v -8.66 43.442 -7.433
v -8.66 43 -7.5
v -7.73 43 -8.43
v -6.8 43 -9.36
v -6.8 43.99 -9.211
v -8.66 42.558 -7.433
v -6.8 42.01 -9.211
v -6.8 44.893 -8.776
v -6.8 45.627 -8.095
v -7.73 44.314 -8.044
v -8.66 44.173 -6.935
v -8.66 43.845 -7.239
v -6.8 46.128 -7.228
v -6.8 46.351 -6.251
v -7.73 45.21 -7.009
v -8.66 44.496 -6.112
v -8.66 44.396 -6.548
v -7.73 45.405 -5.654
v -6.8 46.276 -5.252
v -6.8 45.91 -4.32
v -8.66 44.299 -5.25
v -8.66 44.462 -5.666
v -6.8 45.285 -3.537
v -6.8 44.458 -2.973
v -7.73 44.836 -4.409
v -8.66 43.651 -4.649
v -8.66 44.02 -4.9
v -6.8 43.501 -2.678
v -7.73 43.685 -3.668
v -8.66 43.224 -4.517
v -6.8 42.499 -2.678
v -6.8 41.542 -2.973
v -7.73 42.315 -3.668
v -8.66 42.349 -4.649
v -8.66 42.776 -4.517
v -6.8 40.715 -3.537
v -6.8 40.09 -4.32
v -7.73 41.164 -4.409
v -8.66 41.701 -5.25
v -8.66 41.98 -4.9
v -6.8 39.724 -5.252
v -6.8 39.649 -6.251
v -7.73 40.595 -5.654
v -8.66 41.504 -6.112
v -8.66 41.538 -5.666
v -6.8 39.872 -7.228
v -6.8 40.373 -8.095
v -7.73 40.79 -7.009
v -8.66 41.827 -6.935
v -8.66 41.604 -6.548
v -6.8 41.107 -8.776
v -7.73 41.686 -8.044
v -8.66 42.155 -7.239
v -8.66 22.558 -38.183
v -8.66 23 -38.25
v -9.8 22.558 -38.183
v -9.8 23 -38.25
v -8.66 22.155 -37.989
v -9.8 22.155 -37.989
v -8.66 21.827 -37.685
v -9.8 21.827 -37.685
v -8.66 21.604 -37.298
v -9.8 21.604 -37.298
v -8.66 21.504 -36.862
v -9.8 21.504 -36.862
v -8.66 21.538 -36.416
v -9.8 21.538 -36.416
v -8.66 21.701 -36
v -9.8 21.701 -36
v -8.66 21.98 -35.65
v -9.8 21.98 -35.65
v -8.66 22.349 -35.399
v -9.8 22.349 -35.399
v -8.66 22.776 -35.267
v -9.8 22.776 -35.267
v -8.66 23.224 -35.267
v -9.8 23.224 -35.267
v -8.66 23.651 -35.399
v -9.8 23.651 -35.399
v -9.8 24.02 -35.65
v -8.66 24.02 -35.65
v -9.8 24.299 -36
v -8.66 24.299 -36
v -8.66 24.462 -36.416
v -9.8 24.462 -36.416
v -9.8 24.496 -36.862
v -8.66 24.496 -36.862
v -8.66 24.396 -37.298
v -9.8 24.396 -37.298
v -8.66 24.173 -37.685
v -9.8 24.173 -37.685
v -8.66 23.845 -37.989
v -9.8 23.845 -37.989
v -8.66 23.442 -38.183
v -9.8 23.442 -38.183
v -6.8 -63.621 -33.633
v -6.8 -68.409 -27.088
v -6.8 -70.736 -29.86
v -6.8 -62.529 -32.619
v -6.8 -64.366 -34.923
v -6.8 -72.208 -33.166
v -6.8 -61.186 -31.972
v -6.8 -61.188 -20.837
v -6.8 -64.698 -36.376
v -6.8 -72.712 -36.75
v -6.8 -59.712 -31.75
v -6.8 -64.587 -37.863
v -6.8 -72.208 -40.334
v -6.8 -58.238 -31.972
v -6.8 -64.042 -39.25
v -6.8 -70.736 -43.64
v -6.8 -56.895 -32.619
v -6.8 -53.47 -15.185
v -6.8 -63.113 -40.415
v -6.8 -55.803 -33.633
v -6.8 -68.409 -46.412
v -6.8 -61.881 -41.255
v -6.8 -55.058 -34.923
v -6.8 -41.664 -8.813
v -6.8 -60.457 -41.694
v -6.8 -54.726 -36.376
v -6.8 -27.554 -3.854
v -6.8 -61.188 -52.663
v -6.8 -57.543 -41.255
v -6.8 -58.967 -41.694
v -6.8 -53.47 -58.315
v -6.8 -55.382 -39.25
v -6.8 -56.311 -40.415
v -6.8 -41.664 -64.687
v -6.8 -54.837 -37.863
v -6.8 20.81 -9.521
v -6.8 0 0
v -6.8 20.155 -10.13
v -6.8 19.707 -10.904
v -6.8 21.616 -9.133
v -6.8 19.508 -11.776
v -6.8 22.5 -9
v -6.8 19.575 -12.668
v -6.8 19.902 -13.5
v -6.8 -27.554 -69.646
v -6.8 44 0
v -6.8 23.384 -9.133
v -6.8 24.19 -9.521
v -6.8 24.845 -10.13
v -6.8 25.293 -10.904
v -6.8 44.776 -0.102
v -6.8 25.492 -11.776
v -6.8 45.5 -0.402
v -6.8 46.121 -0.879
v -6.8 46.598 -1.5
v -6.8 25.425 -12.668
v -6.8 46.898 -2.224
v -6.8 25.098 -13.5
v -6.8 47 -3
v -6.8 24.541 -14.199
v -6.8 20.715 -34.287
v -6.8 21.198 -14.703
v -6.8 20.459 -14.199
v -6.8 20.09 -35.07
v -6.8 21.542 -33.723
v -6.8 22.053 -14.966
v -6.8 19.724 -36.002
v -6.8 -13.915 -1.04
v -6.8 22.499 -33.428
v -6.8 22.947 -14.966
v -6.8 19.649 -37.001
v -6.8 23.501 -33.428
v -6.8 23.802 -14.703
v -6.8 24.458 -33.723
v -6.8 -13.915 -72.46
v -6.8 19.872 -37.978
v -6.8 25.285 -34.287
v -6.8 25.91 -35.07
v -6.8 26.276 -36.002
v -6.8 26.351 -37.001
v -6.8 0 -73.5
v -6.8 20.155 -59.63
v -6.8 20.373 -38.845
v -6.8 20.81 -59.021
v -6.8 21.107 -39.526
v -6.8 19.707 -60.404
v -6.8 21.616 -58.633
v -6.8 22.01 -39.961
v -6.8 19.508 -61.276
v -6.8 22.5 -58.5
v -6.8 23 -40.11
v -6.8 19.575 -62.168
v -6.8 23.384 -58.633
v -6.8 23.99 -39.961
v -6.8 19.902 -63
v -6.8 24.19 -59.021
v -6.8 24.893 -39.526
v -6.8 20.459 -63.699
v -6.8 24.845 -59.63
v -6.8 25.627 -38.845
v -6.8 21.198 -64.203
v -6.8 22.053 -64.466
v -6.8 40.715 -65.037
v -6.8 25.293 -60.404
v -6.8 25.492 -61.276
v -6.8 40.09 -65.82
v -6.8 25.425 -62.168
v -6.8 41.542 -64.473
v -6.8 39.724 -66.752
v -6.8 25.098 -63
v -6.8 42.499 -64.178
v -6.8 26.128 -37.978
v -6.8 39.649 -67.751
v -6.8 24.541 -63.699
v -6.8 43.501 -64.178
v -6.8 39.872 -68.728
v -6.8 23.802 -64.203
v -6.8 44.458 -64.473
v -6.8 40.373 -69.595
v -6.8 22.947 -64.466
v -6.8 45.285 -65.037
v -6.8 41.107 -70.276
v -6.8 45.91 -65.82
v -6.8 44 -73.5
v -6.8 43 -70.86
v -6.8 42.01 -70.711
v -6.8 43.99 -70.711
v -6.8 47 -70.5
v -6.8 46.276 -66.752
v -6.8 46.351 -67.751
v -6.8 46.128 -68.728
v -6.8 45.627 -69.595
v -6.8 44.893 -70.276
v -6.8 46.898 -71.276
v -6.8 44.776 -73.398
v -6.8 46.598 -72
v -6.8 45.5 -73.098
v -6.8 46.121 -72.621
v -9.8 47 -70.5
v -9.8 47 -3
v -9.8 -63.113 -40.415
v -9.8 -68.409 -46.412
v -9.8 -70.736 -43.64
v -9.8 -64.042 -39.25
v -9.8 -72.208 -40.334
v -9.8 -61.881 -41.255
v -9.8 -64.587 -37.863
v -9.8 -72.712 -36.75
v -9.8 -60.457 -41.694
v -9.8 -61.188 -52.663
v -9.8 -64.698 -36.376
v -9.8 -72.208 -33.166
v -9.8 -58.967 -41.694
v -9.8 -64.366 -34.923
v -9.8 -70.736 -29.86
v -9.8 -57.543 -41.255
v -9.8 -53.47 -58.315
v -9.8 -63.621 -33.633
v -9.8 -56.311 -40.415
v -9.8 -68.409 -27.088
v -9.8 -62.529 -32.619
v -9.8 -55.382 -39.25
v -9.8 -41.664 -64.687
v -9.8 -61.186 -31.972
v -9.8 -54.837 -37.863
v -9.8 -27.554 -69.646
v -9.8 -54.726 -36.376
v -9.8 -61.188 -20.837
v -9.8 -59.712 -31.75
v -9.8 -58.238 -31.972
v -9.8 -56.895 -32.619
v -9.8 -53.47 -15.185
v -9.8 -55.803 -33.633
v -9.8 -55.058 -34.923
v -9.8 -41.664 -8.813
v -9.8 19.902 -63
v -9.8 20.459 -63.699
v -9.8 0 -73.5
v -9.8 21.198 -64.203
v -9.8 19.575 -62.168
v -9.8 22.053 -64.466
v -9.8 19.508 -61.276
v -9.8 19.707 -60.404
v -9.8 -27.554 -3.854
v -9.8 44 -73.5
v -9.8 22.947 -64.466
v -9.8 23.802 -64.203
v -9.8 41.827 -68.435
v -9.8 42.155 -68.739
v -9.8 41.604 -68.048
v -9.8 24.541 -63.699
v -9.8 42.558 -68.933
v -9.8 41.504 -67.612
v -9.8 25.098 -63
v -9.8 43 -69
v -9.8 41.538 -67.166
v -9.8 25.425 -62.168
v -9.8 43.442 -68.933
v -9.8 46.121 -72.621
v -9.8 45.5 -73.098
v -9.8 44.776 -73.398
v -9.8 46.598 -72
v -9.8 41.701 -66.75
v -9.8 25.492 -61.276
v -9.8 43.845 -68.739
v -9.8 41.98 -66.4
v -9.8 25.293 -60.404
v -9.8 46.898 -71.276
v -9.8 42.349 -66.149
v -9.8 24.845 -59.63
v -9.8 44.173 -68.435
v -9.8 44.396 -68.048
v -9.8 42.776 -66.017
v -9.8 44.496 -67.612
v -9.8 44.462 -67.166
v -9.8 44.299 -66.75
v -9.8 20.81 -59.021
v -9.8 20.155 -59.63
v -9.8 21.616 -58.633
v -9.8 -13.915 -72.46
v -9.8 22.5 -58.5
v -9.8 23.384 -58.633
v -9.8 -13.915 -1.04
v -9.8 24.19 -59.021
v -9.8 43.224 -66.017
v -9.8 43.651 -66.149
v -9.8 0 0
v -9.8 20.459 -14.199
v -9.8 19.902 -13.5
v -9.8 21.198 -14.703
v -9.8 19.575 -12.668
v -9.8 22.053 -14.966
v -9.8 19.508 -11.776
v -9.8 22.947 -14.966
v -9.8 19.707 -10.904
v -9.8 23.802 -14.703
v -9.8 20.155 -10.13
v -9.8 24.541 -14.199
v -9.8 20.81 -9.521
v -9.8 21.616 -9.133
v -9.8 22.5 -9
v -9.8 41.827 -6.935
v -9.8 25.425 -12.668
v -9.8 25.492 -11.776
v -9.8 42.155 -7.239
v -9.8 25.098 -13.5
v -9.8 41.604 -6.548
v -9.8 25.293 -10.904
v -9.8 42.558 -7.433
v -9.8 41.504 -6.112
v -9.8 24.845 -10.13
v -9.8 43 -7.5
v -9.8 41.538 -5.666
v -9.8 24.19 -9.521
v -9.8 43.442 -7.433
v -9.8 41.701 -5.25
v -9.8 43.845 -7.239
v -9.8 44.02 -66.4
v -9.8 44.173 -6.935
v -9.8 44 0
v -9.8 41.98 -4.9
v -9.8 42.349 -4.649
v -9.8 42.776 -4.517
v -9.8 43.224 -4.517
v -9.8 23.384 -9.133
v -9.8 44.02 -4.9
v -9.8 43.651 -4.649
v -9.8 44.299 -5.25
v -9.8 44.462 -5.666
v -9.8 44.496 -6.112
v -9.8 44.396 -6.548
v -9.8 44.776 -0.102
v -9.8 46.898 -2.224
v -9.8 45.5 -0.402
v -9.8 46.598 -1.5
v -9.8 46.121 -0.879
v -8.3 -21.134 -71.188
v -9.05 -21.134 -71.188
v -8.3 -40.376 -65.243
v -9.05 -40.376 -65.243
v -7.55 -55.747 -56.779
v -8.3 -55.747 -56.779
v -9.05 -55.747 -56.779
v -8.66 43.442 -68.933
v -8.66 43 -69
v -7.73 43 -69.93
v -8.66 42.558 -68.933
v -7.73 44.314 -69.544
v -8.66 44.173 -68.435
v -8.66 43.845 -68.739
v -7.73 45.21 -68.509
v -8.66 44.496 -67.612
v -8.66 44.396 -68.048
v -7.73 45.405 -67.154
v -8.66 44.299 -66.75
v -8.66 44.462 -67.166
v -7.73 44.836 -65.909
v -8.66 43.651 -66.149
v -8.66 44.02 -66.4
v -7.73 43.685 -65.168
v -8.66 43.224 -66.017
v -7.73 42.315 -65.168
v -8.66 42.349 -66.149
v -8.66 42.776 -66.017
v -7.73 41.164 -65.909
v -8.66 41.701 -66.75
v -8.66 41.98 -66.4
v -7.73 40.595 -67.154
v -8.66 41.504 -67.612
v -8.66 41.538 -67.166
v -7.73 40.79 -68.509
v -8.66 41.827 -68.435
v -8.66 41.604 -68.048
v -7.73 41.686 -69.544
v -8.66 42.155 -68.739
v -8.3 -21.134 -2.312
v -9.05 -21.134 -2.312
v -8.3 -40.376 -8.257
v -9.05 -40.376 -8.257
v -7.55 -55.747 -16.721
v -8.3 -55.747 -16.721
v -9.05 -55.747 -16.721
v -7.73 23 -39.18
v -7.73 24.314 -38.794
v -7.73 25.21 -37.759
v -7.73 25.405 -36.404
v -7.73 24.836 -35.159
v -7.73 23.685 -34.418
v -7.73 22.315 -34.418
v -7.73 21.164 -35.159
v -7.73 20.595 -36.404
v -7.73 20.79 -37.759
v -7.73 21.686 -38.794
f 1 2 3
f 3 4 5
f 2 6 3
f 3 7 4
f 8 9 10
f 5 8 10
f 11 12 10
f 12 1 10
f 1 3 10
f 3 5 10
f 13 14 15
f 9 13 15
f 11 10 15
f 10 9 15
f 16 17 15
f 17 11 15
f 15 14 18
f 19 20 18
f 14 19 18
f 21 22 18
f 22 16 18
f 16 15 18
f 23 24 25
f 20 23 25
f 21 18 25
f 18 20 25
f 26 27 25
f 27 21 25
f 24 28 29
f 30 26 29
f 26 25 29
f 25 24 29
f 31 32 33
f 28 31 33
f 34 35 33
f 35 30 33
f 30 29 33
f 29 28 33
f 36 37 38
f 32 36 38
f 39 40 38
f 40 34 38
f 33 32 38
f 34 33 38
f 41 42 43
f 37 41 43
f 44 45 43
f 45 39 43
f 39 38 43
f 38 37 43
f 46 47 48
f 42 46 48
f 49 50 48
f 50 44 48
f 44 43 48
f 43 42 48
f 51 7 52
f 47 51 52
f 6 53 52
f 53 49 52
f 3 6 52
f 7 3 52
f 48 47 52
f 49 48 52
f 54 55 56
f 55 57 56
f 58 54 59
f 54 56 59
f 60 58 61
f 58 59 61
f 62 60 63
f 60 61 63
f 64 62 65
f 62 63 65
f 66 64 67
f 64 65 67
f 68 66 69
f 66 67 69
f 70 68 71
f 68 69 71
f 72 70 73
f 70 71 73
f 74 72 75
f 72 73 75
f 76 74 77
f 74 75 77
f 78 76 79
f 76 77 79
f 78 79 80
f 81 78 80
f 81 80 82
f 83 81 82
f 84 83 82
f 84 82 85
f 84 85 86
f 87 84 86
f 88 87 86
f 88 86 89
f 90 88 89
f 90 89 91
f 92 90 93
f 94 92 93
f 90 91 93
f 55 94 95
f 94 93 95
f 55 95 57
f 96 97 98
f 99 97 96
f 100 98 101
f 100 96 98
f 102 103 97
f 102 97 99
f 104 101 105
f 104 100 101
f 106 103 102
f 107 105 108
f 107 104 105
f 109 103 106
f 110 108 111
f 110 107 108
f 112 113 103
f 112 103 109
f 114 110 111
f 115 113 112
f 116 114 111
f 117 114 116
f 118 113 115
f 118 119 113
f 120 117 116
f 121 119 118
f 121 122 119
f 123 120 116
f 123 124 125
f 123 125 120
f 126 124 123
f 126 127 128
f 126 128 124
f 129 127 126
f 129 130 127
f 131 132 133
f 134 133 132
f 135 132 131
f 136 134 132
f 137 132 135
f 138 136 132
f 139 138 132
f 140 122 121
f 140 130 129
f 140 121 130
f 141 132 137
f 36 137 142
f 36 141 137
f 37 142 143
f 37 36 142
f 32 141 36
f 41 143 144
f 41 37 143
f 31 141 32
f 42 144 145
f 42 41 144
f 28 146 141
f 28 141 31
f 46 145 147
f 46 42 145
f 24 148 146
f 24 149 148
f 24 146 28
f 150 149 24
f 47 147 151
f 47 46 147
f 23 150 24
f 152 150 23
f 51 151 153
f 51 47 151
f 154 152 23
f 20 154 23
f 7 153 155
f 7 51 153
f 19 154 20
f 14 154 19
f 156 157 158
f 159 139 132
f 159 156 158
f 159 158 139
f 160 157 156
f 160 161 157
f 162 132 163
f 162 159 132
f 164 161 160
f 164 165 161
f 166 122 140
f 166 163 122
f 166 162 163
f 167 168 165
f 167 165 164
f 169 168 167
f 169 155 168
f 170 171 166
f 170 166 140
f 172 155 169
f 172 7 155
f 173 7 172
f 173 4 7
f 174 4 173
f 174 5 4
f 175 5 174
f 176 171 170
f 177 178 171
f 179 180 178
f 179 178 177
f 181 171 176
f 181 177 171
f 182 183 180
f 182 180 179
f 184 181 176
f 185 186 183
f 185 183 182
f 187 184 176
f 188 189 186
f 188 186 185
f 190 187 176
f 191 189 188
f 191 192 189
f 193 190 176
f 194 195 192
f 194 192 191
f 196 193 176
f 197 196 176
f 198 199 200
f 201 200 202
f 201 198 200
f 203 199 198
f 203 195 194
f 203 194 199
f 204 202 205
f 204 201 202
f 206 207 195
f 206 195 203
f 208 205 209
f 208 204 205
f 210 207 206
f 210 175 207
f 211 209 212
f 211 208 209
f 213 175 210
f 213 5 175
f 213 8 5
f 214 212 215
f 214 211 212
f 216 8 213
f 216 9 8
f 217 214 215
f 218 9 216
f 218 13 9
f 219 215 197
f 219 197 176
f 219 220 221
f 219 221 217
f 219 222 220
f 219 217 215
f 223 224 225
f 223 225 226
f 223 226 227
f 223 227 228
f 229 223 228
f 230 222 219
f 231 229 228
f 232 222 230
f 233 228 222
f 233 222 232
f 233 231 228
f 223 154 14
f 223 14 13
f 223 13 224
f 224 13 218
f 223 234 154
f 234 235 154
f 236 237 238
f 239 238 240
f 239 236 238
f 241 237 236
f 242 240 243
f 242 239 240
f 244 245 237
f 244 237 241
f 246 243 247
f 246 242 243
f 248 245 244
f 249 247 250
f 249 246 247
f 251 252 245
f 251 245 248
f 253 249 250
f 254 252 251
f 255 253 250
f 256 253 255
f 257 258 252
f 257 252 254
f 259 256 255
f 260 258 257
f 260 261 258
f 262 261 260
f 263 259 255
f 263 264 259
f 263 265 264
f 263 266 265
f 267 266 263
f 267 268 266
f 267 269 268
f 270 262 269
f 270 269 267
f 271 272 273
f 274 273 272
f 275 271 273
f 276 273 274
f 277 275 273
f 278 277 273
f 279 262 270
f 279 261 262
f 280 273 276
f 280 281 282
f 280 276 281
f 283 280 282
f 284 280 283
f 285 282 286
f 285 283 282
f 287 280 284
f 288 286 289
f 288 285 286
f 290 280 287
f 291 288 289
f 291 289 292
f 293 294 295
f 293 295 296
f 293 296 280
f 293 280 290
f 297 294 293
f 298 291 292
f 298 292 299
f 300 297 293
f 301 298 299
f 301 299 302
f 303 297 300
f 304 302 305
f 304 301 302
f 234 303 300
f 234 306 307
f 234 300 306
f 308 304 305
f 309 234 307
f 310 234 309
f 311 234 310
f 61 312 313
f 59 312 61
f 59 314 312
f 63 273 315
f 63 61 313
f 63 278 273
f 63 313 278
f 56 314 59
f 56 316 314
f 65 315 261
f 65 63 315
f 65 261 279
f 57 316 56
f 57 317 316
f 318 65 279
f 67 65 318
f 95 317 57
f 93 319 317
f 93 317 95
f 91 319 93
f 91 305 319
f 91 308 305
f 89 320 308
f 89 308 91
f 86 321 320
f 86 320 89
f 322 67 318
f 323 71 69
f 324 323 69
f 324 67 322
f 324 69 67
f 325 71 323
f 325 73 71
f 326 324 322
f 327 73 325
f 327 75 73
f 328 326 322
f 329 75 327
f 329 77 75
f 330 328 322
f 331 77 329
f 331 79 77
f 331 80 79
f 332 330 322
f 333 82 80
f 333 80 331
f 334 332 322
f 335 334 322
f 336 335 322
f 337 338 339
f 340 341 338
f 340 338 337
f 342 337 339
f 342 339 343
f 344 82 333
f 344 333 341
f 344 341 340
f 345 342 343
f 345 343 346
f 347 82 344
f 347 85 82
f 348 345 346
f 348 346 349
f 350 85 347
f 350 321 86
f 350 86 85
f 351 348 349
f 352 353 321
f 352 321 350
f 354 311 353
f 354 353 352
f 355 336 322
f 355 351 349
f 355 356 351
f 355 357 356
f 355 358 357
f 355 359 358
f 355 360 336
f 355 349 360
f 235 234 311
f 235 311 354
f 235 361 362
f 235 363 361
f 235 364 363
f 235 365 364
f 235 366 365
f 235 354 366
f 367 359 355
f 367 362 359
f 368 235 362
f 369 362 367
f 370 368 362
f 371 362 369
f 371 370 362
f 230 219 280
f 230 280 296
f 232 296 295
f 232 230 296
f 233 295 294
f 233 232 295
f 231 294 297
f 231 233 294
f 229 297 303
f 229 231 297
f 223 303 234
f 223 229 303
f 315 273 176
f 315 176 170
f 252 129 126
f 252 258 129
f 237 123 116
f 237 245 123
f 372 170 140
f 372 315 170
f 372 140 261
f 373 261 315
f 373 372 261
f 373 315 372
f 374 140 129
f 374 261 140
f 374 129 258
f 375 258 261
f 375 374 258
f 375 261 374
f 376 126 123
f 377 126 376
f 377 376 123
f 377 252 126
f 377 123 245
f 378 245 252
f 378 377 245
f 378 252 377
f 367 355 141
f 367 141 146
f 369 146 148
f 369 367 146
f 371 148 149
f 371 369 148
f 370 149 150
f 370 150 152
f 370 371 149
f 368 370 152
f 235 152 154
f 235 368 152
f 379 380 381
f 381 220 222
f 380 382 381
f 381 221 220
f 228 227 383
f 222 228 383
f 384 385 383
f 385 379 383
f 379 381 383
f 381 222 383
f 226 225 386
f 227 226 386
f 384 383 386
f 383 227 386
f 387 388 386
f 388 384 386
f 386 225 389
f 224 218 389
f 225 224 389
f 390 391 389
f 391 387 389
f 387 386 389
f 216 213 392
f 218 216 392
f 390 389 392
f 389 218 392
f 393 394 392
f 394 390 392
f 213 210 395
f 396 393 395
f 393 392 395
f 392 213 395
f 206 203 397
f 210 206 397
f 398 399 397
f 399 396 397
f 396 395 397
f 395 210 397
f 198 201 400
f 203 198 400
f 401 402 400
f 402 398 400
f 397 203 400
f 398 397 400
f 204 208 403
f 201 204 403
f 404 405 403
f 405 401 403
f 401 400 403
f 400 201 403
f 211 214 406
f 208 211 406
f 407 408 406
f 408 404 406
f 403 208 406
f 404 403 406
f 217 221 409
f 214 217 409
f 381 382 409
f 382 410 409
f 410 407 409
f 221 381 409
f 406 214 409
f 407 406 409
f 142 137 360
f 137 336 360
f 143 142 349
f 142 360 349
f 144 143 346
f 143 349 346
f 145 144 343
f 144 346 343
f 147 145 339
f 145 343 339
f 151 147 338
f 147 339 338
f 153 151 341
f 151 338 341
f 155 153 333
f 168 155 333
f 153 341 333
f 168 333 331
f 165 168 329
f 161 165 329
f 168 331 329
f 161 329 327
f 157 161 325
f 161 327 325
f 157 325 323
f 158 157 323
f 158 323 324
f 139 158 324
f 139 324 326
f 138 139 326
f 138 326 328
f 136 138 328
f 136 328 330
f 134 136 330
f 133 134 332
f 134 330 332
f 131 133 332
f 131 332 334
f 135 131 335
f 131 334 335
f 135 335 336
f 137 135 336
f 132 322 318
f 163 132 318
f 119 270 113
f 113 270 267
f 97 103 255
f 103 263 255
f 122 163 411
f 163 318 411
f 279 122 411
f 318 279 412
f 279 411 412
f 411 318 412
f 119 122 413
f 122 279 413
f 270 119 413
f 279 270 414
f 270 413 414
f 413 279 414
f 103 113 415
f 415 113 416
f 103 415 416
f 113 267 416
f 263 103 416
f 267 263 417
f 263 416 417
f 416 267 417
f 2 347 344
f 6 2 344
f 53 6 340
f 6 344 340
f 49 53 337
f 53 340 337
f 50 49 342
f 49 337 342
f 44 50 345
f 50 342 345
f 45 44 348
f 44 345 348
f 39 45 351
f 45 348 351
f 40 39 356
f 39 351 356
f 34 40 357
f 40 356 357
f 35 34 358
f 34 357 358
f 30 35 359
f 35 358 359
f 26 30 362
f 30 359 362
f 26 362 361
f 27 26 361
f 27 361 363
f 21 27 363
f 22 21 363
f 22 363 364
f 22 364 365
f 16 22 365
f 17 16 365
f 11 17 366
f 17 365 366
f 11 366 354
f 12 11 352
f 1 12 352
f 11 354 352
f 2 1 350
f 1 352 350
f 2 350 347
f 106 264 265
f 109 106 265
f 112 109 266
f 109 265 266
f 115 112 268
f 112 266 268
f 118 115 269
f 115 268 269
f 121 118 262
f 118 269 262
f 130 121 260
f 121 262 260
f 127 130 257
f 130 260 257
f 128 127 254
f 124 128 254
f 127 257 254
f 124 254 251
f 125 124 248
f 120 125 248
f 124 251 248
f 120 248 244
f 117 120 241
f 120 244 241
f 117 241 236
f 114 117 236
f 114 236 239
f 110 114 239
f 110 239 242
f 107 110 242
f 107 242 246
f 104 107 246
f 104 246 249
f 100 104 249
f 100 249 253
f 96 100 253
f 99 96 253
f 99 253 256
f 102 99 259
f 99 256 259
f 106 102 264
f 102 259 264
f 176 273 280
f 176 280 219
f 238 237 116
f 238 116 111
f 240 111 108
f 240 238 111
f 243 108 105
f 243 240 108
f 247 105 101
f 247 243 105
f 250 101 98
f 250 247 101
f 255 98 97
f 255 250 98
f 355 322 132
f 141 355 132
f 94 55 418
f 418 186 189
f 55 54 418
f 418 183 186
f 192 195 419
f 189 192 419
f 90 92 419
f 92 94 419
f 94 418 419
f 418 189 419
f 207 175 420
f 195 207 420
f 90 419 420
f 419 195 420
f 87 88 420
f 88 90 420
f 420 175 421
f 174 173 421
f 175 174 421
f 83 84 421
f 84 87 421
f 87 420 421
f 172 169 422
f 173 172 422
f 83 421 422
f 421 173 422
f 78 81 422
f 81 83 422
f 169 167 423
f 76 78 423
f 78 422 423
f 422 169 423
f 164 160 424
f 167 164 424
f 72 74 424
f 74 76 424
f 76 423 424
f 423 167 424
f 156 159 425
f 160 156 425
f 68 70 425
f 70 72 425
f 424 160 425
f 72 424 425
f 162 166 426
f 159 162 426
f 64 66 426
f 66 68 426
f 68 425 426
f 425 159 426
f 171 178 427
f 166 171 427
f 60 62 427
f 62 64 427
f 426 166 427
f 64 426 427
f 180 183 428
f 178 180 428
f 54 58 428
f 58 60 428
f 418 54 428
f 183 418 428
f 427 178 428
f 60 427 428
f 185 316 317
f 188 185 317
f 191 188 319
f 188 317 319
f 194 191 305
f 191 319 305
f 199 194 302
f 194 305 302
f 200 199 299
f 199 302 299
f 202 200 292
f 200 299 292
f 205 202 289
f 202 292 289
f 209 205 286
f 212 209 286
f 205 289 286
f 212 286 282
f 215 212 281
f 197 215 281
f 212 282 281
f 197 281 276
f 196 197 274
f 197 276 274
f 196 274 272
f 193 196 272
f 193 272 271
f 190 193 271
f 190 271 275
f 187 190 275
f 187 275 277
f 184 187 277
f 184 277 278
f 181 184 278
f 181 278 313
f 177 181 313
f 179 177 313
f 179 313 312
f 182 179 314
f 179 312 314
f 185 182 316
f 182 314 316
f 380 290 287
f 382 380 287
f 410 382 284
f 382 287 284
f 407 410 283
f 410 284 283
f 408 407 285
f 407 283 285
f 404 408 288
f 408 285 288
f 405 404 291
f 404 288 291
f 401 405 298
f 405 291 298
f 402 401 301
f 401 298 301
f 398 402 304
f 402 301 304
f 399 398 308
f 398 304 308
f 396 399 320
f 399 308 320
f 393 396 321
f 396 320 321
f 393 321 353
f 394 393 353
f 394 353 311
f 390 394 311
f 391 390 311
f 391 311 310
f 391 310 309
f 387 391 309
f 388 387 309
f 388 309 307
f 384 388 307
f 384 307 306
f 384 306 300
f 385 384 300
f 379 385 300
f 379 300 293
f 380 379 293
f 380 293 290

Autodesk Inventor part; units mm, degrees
ref_plane "YZ Plane" through (0, 0, 0) normal (1, 0, 0) x (0, 1, 0)
sketch "Sketch1" plane through (0, 0, 0) normal (0, 0, 1) x (1, 0, 0)
  line L0 (0, 0) -> (16, 0) construction
  line L1 (16, 0) -> (16, 8) construction
  line L2 (0, 8) -> (0, 0) construction
  line L3 (5.5, 10.5) -> (0, 10.5) construction
  line L4 (0, 10.5) -> (0, 8) construction
  line L5 (13.5, 10.5) -> (16, 10.5) construction
  line L6 (16, 10.5) -> (16, 8) construction
  line L7 (6.5, 37) -> (12.5, 37) construction
  line L8 (12.5, 37) -> (12.5, 8) construction
  line L9 (12.5, 8) -> (6.5, 8) construction
  line L10 (6.5, 8) -> (6.5, 37) construction
  line L11 (0.5, 34.5) -> (15.5, 34.5) construction
  line L12 (15.5, 34.5) -> (15.5, 10.5) construction
  line L13 (15.5, 10.5) -> (0.5, 10.5) construction
  line L14 (0.5, 10.5) -> (0.5, 34.5) construction
  line L15 (-6.8, 0) -> (-6.8, 39)
  line L16 (-6.8, 39) -> (22.8, 39)
  line L17 (8, -29.8106) -> (8, -55.1885) construction
  line L18 (-9.8, 47) -> (-9.8, 0)
  line L19 (-6.8, 0) -> (-9.8, 0)
  line L20 (-9.8, 47) -> (10, 47)
  line L21 (25.8, 47) -> (25.8, 0)
  line L22 (22.8, 0) -> (25.8, 0)
  line L23 (25.8, 47) -> (10, 47)
  line L24 (22.8, 0) -> (22.8, 39)
  line L25 (16.05, 25.6) -> (16.05, 19.4) construction
  line L26 (-0.05, 19.4) -> (-0.05, 25.6) construction
  line L27 (-0.05, 25.6) -> (0.5, 25.6) construction
  line L28 (16.05, 25.6) -> (15.5, 25.6) construction
  line L29 (16.05, 19.4) -> (15.5, 19.4) construction
  line L30 (-0.05, 19.4) -> (0.5, 19.4) construction
  line L31 (16.05, 22.5) -> (-0.05, 22.5) construction
  line L32 (0, 8) -> (16, 8) construction
  line L33 (5.5, 10.5) -> (5.5, 8) construction
  line L34 (13.5, 10.5) -> (13.5, 8) construction
  line L35 (5.5, 8) -> (13.5, 8) construction
  point P0 (6.5, 22.5)
  point P1 (0.5, 22.5)
  point P2 (9.5, 8)
  point P3 (8, 0)
  point P4 (8, 39)
  point P5 (8, -42.4996)
  point P6 (9.5, 8)
  point P7 (8, 22.5)
  dimension "d1" = 16
  dimension "d7" = 6
  dimension "d9" = 6
  dimension "d10" = 3
  dimension "d11" = 29
  dimension "d12" = 24
  dimension "d19" = 29.6
  dimension "d20" = 2
  dimension "thickness" = 3
  dimension "d23" = 8
  dimension "d31" = 22.5
  dimension "d40" = 24.5
  dimension "d41" = 39
  dimension "d60" = 6.2
  dimension "d62" = 16.1
  dimension "d63" = 8
  dimension "d64" = 8
  dimension "d65" = 1
  dimension "d66" = 2.5
extrude "LENGTH" add sketch "Sketch1" against normal blind 73.5
sketch "Sketch2" plane through (-9.8, 0, 0) normal (-1, 0, 0) x (0, 0, 1)
  circle A0 centre (-12, 22.5) radius 3
  circle A1 centre (-61.5, 22.5) radius 3
  line L0 (-73.5, 0) -> (-73.5, 47) construction
  line L1 (0, 47) -> (0, 0) construction
  dimension "d26" = 6
  dimension "d28" = 6
  dimension "d29" = 12
  dimension "d30" = 12
  dimension "d32" = 22.5
extrude "Extrusion2" cut sketch "Sketch2" against normal through all
ref_plane "Work Plane1" through (-9.8, 47, 0) normal (0.7071, 0.7071, 0) x (0, 0, -1)
ref_plane "CentrePlane" through (8, 0, 0) normal (1, 0, 0) x (0, 0, -1)
sketch "Measurements" plane through (-9.8, 0, 0) normal (-1, 0, 0) x (0, 0, 1)
  line L0 (-18.9044, 8) -> (-18.9044, 0) construction
  line L1 (0, 0) -> (0, 8) construction
  spline S0 degree 3 poles (-18.9044, 0) (-18.8729, 0.004) (-18.7747, 0.0145) (-18.6089, 0.0198) (-18.4076, 0.0173) (-18.2077, -0.0064) (-18.0095, -0.0413) (-17.7511, -0.1137) (-17.4304, -0.2111) (-17.1073, -0.2999) (-16.8501, -0.3765) (-16.6638, -0.4528) (-16.4821, -0.5394) (-16.3106, -0.6447) (-16.1439, -0.7575) (-15.9893, -0.8866) (-15.8435, -1.0251) (-15.7068, -1.1728) (-15.5834, -1.3319) (-15.4695, -1.4977) (-15.3662, -1.6705) (-15.2464, -1.9105) (-15.1208, -2.2219) (-15.0142, -2.6104) (-14.9462, -3.0072) (-14.9104, -3.408) (-14.9034, -3.8104) (-14.9258, -4.2123) (-14.9692, -4.6123) (-15.0344, -5.0094) (-15.0913, -5.2714) (-15.1198, -5.4024) knots -0.847201 -0.847201 -0.847201 -0.847201 -0.83705 -0.815587 -0.794126 -0.772659 -0.751201 -0.729734 -0.686802 -0.64387 -0.622403 -0.600945 -0.579478 -0.558017 -0.536554 -0.515088 -0.49363 -0.472163 -0.450698 -0.429238 -0.407769 -0.386302 -0.343394 -0.300476 -0.257562 -0.214646 -0.17172 -0.12879 -0.085861 -0.04293 0 0 0 0 construction
  spline S1 degree 3 poles (-4.5152, -5.4024) (-4.5336, -5.2605) (-4.5704, -4.9766) (-4.6037, -4.5484) (-4.6135, -4.119) (-4.6009, -3.6896) (-4.557, -3.2623) (-4.4825, -2.8392) (-4.3742, -2.4233) (-4.2256, -2.0199) (-4.0637, -1.7) (-3.9145, -1.4557) (-3.7891, -1.2813) (-3.6528, -1.1153) (-3.5072, -0.9573) (-3.3484, -0.8126) (-3.1807, -0.6785) (-3.0046, -0.5552) (-2.8172, -0.4504) (-2.6251, -0.3539) (-2.424, -0.2783) (-2.219, -0.214) (-1.9385, -0.1559) (-1.5868, -0.0908) (-1.2369, -0.0163) (-0.9555, 0.0373) (-0.7415, 0.0564) (-0.5268, 0.0635) (-0.3125, 0.0479) (-0.1366, 0.0272) (-0.0331, 0.0071) (0, 0) knots -1.373604 -1.373604 -1.373604 -1.373604 -1.330674 -1.287743 -1.244814 -1.201884 -1.158958 -1.116042 -1.073128 -1.03021 -0.987302 -0.965835 -0.944366 -0.922906 -0.901441 -0.879974 -0.858516 -0.83705 -0.815587 -0.794126 -0.772659 -0.751201 -0.729734 -0.686802 -0.64387 -0.622403 -0.600945 -0.579478 -0.558017 -0.536554 -0.526403 -0.526403 -0.526403 -0.526403 construction
  spline S2 degree 3 poles (-7.7374, -14.9236) (-7.6284, -14.7418) (-7.4104, -14.3783) (-7.0987, -13.824) (-6.7983, -13.2636) (-6.5111, -12.6963) (-6.2373, -12.1224) (-5.9778, -11.5419) (-5.7335, -10.9548) (-5.5053, -10.3613) (-5.2945, -9.7613) (-5.1024, -9.1551) (-4.9307, -8.5428) (-4.7815, -7.9246) (-4.6579, -7.3008) (-4.5633, -6.6718) (-4.516, -6.1439) (-4.4999, -5.72) (-4.5101, -5.5083) (-4.5152, -5.4024) knots -1.017256 -1.017256 -1.017256 -1.017256 -0.953675 -0.890094 -0.826513 -0.762932 -0.699351 -0.63577 -0.572189 -0.508609 -0.445029 -0.381449 -0.31787 -0.254291 -0.190714 -0.127139 -0.063568 -0.03178 0 0 0 0 construction
  arc A0 (-11.8976, -14.9236) -> (-7.7374, -14.9236) centre (-9.8175, 41.288) ccw construction
  spline S3 degree 3 poles (-15.1198, -5.4024) (-15.1249, -5.5083) (-15.1352, -5.72) (-15.119, -6.1439) (-15.0717, -6.6718) (-14.9771, -7.3008) (-14.8535, -7.9246) (-14.7043, -8.5428) (-14.5326, -9.1551) (-14.3405, -9.7613) (-14.1297, -10.3613) (-13.9015, -10.9548) (-13.6572, -11.5419) (-13.3977, -12.1224) (-13.1239, -12.6963) (-12.8366, -13.2636) (-12.5363, -13.824) (-12.2245, -14.3782) (-12.0065, -14.7418) (-11.8976, -14.9236) knots -1.017256 -1.017256 -1.017256 -1.017256 -0.985476 -0.953687 -0.890117 -0.826542 -0.762964 -0.699386 -0.635807 -0.572227 -0.508647 -0.445066 -0.381486 -0.317905 -0.254324 -0.190743 -0.127162 -0.063581 0 0 0 0 construction
  line L2 (-18.9044, 8) -> (0, 8) construction
  line L3 (0, 43) -> (0, 0) construction
  circle A1 centre (-9.8175, -59.712) radius 50 construction
  line L4 (0, 0) -> (-73.5, 0) projected
  point P0 (-9.8175, -14.962)
  dimension "d42" = 8
  dimension "d43" = 100
  dimension "d44" = 44.75
  dimension "d46" = 9.8175
  dimension "d47" = 14.962
  dimension "d49" = 59.712
sketch "Sketch5" plane through (-9.8, 0, 0) normal (-1, 0, 0) x (0, 0, 1)
  circle A0 centre (-36.75, -59.712) radius 50 construction
  line L0 (0, 0) -> (-73.5, 0) projected
  circle A1 centre (-36.75, -59.712) radius 5
  arc A2 (-46.4124, -68.4091) -> (-27.0876, -68.4091) centre (-36.75, -59.712) ccw
  line L1 (-36.75, 56.2641) -> (-36.75, 80.2382)
  line L2 (0, 0) -> (-73.5, 0) projected
  spline S0 degree 4 poles (0, 0) (0, -20.6328) (-6.9347, -45.2291) (-15.8528, -55.9272) (-27.0876, -68.4091) knots 0 0 0 0 0 1 1 1 1 1
  line L3 (0, 0) -> (0, 47) projected
  spline S1 degree 4 poles (-73.5, 0) (-73.5, -20.6328) (-66.5653, -45.2291) (-57.6472, -55.9272) (-46.4124, -68.4091) knots 0 0 0 0 0 1 1 1 1 1
  line L4 (-73.5, 47) -> (-73.5, 0) projected
  point P0 (-36.75, 0)
  point P1 (-36.75, 0)
  point P2 (-9.7513, -43.7182)
  point P3 (-63.7487, -43.7182)
  dimension "d50" = 59.712
  dimension "d51" = 100
  dimension "bearingOD" = 10
  dimension "d53" = 8
extrude "Extrusion4" add sketch "Sketch5" against normal up to surface (3 mm away)
mirror "Mirror2" about plane through (8, 0, 0) normal (1, 0, 0) of "Extrusion4"
sketch "Sketch6" plane through (-6.8, 39, 0) normal (1, 0, 0) x (0, 0, -1)
  line L0 (-41.9522, 50.4986) -> (119.8165, 50.4986)
  line L1 (119.8165, 50.4986) -> (119.8165, -146.1585)
  line L2 (119.8165, -146.1585) -> (-41.9522, -146.1585)
  line L3 (-41.9522, -146.1585) -> (-41.9522, 50.4986)
  point P0 (0, -39)
extrude "Extrusion5" cut sketch "Sketch6" along normal through all
sketch "Sketch7" plane through (-6.8, 47, 0) normal (1, 0, 0) x (0, 0, -1)
  circle A0 centre (6, -4) radius 3.485
  circle A1 centre (36.75, -24) radius 3.485
  line L0 (36.75, -50.9937) -> (36.75, -60.2424)
  line L1 (0, 0) -> (73.5, 0) projected
  circle A2 centre (67.5, -4) radius 3.485
  line L2 (0, -47) -> (0, 0) projected
  point P0 (36.75, 0)
  dimension "d69" = 6.97
  dimension "d70" = 6
  dimension "d71" = 24
  dimension "d72" = 4
hole "Hole1" at (-6.8, 43, -6) at (-6.8, 23, -36.75) at (-6.8, 43, -67.5) direction (-1, 0, 0) diameter 3 end through all countersink diameter 6.72 countersink angle 90
fillet "Fillet3" radius 3 2 edges at (-8.3, 47, 0) (-8.3, 47, -73.5)
equation "\"d23\" = d0"
equation "\"tol\" = 1"
equation "\"d0\" = 8"
properties part number "trolley6mm-sides"
